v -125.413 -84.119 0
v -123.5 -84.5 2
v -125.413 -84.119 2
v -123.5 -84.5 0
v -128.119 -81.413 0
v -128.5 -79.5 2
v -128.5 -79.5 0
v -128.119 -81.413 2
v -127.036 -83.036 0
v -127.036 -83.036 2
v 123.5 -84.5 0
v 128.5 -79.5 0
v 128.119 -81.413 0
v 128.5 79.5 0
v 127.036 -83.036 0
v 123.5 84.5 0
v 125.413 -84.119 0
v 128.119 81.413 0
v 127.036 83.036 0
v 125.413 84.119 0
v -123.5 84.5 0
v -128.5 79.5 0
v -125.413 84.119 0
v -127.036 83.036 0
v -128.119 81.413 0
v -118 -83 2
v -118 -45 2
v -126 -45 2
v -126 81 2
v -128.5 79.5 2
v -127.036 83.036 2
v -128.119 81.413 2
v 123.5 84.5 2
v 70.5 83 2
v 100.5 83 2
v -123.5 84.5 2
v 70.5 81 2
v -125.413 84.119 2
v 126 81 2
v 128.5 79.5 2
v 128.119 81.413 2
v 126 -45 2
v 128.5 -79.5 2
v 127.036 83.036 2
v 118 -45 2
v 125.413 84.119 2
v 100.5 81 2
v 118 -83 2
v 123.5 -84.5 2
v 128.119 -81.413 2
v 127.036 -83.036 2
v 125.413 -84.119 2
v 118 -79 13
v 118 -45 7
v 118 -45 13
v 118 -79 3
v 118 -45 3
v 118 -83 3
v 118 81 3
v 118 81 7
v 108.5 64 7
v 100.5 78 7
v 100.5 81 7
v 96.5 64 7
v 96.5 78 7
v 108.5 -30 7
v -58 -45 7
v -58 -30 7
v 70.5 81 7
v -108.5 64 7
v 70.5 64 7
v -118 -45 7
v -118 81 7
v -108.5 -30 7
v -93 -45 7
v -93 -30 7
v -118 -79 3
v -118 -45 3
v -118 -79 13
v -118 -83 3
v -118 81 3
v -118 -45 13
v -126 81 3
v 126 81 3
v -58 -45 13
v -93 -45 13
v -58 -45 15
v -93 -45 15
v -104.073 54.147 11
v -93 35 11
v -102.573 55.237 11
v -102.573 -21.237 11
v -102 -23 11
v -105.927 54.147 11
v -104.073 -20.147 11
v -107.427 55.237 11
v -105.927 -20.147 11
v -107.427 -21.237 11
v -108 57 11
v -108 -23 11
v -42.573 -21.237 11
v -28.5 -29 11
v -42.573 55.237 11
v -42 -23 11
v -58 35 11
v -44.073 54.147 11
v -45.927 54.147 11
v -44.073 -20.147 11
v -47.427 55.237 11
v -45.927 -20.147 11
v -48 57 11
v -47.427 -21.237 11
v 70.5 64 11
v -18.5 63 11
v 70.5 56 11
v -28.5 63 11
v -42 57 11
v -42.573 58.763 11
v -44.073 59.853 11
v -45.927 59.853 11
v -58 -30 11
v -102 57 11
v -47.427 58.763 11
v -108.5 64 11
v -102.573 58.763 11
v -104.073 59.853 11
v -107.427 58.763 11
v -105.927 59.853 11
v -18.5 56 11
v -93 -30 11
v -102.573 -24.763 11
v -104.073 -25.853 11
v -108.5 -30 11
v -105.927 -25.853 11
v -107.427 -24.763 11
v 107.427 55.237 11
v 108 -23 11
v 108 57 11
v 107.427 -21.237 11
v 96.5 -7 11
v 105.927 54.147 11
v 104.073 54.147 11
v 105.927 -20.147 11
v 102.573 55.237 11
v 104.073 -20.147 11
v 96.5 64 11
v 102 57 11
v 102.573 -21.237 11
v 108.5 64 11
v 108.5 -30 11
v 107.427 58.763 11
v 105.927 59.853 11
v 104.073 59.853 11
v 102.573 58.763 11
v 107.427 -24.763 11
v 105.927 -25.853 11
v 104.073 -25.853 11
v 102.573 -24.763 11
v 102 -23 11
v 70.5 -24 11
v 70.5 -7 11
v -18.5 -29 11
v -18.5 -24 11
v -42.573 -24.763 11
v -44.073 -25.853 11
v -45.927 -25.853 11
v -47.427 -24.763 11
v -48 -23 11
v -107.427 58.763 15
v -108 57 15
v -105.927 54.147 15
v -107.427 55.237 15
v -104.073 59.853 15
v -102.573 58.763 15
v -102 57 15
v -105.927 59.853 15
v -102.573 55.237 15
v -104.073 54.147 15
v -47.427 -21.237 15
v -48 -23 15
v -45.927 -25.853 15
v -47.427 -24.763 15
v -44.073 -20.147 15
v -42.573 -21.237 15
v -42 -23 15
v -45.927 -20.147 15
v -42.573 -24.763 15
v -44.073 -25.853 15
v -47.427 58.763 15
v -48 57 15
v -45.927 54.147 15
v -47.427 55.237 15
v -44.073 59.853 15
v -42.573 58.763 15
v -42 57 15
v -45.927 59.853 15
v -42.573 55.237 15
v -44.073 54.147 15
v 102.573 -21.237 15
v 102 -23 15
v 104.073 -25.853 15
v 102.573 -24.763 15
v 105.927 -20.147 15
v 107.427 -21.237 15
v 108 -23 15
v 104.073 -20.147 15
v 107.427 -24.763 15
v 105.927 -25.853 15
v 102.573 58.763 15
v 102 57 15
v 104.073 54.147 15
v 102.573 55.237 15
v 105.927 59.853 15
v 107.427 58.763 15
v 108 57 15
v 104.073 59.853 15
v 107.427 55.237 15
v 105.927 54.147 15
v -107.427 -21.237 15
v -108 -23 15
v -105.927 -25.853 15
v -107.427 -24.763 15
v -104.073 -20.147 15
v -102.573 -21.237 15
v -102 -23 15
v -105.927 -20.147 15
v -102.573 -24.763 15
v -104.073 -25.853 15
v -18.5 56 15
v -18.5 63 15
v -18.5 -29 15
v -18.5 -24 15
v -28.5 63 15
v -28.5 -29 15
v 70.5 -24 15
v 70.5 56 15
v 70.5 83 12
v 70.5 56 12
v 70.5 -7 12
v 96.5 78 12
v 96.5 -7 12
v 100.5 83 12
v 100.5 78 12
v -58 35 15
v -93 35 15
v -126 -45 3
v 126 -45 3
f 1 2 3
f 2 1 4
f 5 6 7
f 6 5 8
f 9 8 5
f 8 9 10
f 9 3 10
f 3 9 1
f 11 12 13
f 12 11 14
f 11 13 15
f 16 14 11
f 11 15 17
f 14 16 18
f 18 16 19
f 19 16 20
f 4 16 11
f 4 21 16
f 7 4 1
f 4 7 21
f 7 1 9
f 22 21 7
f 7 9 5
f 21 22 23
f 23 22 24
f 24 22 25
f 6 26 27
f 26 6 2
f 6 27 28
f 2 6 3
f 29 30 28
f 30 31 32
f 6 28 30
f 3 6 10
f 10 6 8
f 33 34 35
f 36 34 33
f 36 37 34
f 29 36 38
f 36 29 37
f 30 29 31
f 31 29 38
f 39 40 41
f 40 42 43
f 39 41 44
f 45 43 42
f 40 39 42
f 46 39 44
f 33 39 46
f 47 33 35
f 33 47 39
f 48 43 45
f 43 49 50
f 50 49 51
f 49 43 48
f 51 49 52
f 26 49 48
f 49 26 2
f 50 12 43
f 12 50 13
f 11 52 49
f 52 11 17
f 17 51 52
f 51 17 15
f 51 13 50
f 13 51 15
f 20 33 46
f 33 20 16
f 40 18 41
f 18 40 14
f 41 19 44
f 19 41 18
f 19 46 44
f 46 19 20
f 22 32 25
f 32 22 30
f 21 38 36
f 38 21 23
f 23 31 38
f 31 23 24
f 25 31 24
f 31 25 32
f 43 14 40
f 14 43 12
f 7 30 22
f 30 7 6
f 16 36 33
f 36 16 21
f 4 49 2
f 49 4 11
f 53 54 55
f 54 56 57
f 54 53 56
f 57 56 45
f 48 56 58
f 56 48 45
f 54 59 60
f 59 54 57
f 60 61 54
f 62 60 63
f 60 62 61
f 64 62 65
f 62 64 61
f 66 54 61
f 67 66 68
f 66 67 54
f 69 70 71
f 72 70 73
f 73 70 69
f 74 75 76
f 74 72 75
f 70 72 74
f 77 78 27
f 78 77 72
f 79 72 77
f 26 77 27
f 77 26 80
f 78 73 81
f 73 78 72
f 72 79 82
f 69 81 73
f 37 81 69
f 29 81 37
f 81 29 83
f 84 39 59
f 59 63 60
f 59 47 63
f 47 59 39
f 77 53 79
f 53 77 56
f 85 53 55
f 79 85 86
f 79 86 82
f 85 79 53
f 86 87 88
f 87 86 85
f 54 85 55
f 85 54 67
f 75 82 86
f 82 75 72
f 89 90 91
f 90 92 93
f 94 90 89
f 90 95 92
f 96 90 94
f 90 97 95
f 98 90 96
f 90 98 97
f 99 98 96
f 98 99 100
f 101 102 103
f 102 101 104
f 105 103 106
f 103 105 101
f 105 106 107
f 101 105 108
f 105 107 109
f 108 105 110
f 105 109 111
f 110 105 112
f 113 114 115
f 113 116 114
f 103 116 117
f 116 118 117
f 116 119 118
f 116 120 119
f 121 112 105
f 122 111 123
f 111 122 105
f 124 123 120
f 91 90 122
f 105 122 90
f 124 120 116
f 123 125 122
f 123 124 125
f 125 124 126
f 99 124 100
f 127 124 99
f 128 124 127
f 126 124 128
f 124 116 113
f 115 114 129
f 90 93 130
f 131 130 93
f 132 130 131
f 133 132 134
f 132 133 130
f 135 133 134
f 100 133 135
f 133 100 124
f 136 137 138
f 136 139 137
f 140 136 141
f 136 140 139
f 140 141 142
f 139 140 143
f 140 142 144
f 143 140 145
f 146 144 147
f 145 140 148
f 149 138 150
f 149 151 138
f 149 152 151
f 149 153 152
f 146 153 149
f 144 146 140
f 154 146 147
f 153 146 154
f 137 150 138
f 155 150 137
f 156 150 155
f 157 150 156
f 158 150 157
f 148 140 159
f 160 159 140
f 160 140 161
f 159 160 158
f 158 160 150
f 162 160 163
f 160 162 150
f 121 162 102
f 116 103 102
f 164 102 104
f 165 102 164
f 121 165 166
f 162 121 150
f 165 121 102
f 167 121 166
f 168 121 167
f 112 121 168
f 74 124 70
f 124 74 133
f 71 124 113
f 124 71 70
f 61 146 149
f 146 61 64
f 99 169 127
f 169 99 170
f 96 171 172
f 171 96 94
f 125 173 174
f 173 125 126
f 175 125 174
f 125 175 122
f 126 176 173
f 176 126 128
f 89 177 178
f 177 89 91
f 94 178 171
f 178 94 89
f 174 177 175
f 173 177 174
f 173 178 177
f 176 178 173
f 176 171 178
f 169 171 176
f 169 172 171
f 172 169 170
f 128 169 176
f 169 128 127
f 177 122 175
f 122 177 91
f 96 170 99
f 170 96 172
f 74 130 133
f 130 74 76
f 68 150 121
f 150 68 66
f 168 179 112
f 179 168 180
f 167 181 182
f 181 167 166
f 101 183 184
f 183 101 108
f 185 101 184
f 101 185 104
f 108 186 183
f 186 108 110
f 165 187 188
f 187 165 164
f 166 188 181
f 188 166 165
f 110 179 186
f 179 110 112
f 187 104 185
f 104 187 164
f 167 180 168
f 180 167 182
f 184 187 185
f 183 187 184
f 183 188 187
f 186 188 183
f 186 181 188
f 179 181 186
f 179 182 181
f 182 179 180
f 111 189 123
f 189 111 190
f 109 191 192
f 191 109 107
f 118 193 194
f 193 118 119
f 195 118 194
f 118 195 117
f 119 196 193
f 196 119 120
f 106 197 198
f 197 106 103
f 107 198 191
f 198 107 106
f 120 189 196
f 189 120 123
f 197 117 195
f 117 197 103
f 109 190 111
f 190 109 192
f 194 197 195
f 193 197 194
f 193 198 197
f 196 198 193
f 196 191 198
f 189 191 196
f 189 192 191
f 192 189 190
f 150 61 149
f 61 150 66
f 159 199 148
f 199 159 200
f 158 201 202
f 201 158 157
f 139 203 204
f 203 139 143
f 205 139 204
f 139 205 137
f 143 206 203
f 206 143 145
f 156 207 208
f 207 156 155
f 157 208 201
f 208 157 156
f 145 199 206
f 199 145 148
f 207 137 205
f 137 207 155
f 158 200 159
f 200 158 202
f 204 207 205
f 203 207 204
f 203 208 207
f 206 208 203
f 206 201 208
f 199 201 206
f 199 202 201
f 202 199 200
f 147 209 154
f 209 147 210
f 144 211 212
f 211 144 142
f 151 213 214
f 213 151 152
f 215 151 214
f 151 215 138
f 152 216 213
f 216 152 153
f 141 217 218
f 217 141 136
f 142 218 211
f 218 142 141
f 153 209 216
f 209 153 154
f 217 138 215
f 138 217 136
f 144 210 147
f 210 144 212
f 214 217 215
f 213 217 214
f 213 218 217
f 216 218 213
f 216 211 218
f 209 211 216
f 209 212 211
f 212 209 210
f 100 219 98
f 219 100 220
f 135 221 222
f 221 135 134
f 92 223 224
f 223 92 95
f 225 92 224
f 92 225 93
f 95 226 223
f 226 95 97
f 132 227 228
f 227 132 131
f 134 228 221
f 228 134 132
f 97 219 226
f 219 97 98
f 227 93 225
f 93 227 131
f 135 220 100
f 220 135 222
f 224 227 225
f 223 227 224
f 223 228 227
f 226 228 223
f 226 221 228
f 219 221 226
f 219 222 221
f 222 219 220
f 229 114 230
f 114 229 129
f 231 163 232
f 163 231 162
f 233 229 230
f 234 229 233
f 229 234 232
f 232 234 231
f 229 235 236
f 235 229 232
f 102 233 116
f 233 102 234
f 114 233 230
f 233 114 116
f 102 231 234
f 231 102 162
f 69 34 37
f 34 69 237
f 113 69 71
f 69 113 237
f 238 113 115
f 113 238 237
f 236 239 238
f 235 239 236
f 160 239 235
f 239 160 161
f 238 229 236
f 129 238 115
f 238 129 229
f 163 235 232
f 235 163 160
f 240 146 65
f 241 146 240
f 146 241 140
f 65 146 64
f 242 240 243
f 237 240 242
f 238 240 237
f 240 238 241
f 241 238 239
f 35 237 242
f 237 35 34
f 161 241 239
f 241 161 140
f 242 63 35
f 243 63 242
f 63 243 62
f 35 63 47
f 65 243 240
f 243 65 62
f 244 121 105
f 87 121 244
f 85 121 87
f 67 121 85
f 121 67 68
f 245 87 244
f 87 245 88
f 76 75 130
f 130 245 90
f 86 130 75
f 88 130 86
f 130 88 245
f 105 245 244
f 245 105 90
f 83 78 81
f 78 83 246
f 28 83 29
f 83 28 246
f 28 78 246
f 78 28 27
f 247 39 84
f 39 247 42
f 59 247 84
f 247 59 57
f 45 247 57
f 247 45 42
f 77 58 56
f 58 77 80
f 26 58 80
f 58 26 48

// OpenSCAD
module roundedCube(xx, yy, height, radius) {
    difference() {
        cube([xx,yy,height]);

        difference() {
            translate([-.5,-.5,-.2]) cube([radius+.5,radius+.5,height+.5]);
            translate([radius,radius,height/2]) cylinder(height,radius,radius,true);
        }

        translate([xx,0,0]) rotate(90) difference() {
            translate([-.5,-.5,-.2]) cube([radius+.5,radius+.5,height+.5]);
            translate([radius,radius,height/2]) cylinder(height,radius,radius,true);
        }

        translate([xx,yy,0]) rotate(180) difference() {
            translate([-.5,-.5,-.2]) cube([radius+.5,radius+.5,height+.5]);
            translate([radius,radius,height/2]) cylinder(height,radius,radius,true);
        }

        translate([0,yy,0]) rotate(270) difference() {
            translate([-.5,-.5,-.2]) cube([radius+.5,radius+.5,height+.5]);
            translate([radius,radius,height/2]) cylinder(height,radius,radius,true);
        }
    }
}

// ----------------------------------------------------------------

/* Sunfounder 10.1 inch Display kit */
GlassWidth = 257;
GlassHeight = 169;
GlassDepth = 2;

MainPanelWidth = 236;
MainPanelHeight = 160;
MainPanelDepth = 5;

TopMargin = -1;

SupportAreaWidth = 217;
SupportAreaHeight = 94;
SupportAreaDepth = 4;
DebugSupportArea = 1;

SupportBlockWidth = 7;
SupportBlockHeight = 14;
SupportBlockDepth = 4;
SupportHoleRadius = 3;

module sunfounder_10_1() {
    BottomWidth = MainPanelWidth;
    BottomHeight = 34;
    BottomDepth = 11;

    SideBottomWidth = MainPanelWidth;
    SideBottomHeight = 4;
    SideLRWidth = 8;
    SideLRHeight = 126;

    translate([-GlassWidth / 2, -GlassHeight / 2, 0]) {
        /* Glass */
        color("black") roundedCube(GlassWidth, GlassHeight, GlassDepth, 5);

        translate([0, 0, GlassDepth]) {
            translate([(GlassWidth - MainPanelWidth) / 2,
                       (GlassHeight - MainPanelHeight) / 2 - TopMargin, 0]) {
                /* Main & Bottom */
                color("gray") {
                    cube([MainPanelWidth, MainPanelHeight, MainPanelDepth]);
                    cube([BottomWidth, BottomHeight, BottomDepth]);
                }

                /* DisplayBoard connector */
                color("orange") translate([25, BottomHeight, MainPanelDepth])
                    cube([35, 80, SupportBlockDepth * 2]);

                /* Support Area */
                translate([(MainPanelWidth - SupportAreaWidth) / 2,
                           (MainPanelHeight - SupportAreaHeight) / 2 + 16,
                           MainPanelDepth]) {
                    if (DebugSupportArea) {
                        color("gray", alpha=0.2) {
                            cube([SupportAreaWidth, SupportAreaHeight, SupportAreaDepth]);
                        }
                    }

                    color("red") {
                        /* DisplayBoard LB */
                        cube([SupportBlockWidth, SupportBlockHeight, SupportBlockDepth]);
                        translate([SupportBlockWidth/2, SupportBlockHeight/2, 0])
                            cylinder(SupportBlockDepth * 2, r=SupportHoleRadius);

                        /* DisplayBoard LT */
                        translate([0, SupportAreaHeight-SupportBlockHeight, 0]) {
                            cube([SupportBlockWidth, SupportBlockHeight, SupportBlockDepth]);
                            translate([SupportBlockWidth/2, SupportBlockHeight/2, 0])
                                cylinder(SupportBlockDepth * 2, r=SupportHoleRadius);
                        }

                        /* DisplayBoard RB */
                        translate([60, 0, 0]) {
                            cube([SupportBlockWidth, SupportBlockHeight, SupportBlockDepth]);
                                translate([SupportBlockWidth/2, SupportBlockHeight/2, 0])
                                    cylinder(SupportBlockDepth * 2, r=SupportHoleRadius);
                        }

                        /* DisplayBoard RT */
                        translate([60, SupportAreaHeight-SupportBlockHeight, 0]) {
                            cube([SupportBlockWidth, SupportBlockHeight, SupportBlockDepth]);
                                translate([SupportBlockWidth/2, SupportBlockHeight/2, 0])
                                    cylinder(SupportBlockDepth * 2, r=SupportHoleRadius);
                        }

			/* RpiBoard Vertical Rail */
                        translate([80, SupportAreaHeight - 93, 0]) {
                            cube([10, 92, SupportBlockDepth * 2]);
                        }

                        /* RpiBoard space */
                        translate([80, SupportAreaHeight - 88, 0]) {
                            cube([99, 80, SupportBlockDepth * 2]);
                        }

			/* Right Bottom */
                        translate([SupportAreaWidth - SupportBlockWidth, 0, 0]) {
                            cube([SupportBlockWidth, SupportBlockHeight, SupportBlockDepth]);
                            translate([SupportBlockWidth/2, SupportBlockHeight/2, 0])
                                cylinder(SupportBlockDepth * 2, r=SupportHoleRadius);
                        }

                        /* Right Top */
                        translate([SupportAreaWidth - SupportBlockWidth,
                                   SupportAreaHeight - SupportBlockHeight, 0]) {
                            cube([SupportBlockWidth, SupportBlockHeight, SupportBlockDepth]);
                            translate([SupportBlockWidth/2, SupportBlockHeight/2, 0])
                                cylinder(SupportBlockDepth * 2, r=SupportHoleRadius);
                        }
                    }

                    /* Touch Connector */
                    color("orange") {
                        translate([179, SupportAreaHeight - 71, 0])
                            cube([26, 90, 5]);
                        translate([179, SupportAreaHeight - 71 + 90 - 5, -MainPanelDepth])
                            cube([30, 5, MainPanelDepth + 5]);
                    }
                }
            }

            /* Side - Left/Right/Bottom */
            color("gray") {
                translate([(GlassWidth - MainPanelWidth) / 2 - SideLRWidth,
                           (GlassHeight - MainPanelHeight) / 2 + BottomHeight - TopMargin, 0])
                    cube([SideLRWidth, SideLRHeight, 1]);

                translate([(GlassWidth - MainPanelWidth) / 2 + MainPanelWidth,
                           (GlassHeight - MainPanelHeight) / 2 + BottomHeight - TopMargin, 0])
                    cube([SideLRWidth, SideLRHeight, 1]);

                translate([(GlassWidth - MainPanelWidth) / 2,
                           (GlassHeight - MainPanelHeight) / 2 - SideBottomHeight - TopMargin, 0])
                    cube([BottomWidth, SideBottomHeight, 1]);
            }
        }
    }
}

// ----------------------------------------------------------------

sunfounder_10_1();
